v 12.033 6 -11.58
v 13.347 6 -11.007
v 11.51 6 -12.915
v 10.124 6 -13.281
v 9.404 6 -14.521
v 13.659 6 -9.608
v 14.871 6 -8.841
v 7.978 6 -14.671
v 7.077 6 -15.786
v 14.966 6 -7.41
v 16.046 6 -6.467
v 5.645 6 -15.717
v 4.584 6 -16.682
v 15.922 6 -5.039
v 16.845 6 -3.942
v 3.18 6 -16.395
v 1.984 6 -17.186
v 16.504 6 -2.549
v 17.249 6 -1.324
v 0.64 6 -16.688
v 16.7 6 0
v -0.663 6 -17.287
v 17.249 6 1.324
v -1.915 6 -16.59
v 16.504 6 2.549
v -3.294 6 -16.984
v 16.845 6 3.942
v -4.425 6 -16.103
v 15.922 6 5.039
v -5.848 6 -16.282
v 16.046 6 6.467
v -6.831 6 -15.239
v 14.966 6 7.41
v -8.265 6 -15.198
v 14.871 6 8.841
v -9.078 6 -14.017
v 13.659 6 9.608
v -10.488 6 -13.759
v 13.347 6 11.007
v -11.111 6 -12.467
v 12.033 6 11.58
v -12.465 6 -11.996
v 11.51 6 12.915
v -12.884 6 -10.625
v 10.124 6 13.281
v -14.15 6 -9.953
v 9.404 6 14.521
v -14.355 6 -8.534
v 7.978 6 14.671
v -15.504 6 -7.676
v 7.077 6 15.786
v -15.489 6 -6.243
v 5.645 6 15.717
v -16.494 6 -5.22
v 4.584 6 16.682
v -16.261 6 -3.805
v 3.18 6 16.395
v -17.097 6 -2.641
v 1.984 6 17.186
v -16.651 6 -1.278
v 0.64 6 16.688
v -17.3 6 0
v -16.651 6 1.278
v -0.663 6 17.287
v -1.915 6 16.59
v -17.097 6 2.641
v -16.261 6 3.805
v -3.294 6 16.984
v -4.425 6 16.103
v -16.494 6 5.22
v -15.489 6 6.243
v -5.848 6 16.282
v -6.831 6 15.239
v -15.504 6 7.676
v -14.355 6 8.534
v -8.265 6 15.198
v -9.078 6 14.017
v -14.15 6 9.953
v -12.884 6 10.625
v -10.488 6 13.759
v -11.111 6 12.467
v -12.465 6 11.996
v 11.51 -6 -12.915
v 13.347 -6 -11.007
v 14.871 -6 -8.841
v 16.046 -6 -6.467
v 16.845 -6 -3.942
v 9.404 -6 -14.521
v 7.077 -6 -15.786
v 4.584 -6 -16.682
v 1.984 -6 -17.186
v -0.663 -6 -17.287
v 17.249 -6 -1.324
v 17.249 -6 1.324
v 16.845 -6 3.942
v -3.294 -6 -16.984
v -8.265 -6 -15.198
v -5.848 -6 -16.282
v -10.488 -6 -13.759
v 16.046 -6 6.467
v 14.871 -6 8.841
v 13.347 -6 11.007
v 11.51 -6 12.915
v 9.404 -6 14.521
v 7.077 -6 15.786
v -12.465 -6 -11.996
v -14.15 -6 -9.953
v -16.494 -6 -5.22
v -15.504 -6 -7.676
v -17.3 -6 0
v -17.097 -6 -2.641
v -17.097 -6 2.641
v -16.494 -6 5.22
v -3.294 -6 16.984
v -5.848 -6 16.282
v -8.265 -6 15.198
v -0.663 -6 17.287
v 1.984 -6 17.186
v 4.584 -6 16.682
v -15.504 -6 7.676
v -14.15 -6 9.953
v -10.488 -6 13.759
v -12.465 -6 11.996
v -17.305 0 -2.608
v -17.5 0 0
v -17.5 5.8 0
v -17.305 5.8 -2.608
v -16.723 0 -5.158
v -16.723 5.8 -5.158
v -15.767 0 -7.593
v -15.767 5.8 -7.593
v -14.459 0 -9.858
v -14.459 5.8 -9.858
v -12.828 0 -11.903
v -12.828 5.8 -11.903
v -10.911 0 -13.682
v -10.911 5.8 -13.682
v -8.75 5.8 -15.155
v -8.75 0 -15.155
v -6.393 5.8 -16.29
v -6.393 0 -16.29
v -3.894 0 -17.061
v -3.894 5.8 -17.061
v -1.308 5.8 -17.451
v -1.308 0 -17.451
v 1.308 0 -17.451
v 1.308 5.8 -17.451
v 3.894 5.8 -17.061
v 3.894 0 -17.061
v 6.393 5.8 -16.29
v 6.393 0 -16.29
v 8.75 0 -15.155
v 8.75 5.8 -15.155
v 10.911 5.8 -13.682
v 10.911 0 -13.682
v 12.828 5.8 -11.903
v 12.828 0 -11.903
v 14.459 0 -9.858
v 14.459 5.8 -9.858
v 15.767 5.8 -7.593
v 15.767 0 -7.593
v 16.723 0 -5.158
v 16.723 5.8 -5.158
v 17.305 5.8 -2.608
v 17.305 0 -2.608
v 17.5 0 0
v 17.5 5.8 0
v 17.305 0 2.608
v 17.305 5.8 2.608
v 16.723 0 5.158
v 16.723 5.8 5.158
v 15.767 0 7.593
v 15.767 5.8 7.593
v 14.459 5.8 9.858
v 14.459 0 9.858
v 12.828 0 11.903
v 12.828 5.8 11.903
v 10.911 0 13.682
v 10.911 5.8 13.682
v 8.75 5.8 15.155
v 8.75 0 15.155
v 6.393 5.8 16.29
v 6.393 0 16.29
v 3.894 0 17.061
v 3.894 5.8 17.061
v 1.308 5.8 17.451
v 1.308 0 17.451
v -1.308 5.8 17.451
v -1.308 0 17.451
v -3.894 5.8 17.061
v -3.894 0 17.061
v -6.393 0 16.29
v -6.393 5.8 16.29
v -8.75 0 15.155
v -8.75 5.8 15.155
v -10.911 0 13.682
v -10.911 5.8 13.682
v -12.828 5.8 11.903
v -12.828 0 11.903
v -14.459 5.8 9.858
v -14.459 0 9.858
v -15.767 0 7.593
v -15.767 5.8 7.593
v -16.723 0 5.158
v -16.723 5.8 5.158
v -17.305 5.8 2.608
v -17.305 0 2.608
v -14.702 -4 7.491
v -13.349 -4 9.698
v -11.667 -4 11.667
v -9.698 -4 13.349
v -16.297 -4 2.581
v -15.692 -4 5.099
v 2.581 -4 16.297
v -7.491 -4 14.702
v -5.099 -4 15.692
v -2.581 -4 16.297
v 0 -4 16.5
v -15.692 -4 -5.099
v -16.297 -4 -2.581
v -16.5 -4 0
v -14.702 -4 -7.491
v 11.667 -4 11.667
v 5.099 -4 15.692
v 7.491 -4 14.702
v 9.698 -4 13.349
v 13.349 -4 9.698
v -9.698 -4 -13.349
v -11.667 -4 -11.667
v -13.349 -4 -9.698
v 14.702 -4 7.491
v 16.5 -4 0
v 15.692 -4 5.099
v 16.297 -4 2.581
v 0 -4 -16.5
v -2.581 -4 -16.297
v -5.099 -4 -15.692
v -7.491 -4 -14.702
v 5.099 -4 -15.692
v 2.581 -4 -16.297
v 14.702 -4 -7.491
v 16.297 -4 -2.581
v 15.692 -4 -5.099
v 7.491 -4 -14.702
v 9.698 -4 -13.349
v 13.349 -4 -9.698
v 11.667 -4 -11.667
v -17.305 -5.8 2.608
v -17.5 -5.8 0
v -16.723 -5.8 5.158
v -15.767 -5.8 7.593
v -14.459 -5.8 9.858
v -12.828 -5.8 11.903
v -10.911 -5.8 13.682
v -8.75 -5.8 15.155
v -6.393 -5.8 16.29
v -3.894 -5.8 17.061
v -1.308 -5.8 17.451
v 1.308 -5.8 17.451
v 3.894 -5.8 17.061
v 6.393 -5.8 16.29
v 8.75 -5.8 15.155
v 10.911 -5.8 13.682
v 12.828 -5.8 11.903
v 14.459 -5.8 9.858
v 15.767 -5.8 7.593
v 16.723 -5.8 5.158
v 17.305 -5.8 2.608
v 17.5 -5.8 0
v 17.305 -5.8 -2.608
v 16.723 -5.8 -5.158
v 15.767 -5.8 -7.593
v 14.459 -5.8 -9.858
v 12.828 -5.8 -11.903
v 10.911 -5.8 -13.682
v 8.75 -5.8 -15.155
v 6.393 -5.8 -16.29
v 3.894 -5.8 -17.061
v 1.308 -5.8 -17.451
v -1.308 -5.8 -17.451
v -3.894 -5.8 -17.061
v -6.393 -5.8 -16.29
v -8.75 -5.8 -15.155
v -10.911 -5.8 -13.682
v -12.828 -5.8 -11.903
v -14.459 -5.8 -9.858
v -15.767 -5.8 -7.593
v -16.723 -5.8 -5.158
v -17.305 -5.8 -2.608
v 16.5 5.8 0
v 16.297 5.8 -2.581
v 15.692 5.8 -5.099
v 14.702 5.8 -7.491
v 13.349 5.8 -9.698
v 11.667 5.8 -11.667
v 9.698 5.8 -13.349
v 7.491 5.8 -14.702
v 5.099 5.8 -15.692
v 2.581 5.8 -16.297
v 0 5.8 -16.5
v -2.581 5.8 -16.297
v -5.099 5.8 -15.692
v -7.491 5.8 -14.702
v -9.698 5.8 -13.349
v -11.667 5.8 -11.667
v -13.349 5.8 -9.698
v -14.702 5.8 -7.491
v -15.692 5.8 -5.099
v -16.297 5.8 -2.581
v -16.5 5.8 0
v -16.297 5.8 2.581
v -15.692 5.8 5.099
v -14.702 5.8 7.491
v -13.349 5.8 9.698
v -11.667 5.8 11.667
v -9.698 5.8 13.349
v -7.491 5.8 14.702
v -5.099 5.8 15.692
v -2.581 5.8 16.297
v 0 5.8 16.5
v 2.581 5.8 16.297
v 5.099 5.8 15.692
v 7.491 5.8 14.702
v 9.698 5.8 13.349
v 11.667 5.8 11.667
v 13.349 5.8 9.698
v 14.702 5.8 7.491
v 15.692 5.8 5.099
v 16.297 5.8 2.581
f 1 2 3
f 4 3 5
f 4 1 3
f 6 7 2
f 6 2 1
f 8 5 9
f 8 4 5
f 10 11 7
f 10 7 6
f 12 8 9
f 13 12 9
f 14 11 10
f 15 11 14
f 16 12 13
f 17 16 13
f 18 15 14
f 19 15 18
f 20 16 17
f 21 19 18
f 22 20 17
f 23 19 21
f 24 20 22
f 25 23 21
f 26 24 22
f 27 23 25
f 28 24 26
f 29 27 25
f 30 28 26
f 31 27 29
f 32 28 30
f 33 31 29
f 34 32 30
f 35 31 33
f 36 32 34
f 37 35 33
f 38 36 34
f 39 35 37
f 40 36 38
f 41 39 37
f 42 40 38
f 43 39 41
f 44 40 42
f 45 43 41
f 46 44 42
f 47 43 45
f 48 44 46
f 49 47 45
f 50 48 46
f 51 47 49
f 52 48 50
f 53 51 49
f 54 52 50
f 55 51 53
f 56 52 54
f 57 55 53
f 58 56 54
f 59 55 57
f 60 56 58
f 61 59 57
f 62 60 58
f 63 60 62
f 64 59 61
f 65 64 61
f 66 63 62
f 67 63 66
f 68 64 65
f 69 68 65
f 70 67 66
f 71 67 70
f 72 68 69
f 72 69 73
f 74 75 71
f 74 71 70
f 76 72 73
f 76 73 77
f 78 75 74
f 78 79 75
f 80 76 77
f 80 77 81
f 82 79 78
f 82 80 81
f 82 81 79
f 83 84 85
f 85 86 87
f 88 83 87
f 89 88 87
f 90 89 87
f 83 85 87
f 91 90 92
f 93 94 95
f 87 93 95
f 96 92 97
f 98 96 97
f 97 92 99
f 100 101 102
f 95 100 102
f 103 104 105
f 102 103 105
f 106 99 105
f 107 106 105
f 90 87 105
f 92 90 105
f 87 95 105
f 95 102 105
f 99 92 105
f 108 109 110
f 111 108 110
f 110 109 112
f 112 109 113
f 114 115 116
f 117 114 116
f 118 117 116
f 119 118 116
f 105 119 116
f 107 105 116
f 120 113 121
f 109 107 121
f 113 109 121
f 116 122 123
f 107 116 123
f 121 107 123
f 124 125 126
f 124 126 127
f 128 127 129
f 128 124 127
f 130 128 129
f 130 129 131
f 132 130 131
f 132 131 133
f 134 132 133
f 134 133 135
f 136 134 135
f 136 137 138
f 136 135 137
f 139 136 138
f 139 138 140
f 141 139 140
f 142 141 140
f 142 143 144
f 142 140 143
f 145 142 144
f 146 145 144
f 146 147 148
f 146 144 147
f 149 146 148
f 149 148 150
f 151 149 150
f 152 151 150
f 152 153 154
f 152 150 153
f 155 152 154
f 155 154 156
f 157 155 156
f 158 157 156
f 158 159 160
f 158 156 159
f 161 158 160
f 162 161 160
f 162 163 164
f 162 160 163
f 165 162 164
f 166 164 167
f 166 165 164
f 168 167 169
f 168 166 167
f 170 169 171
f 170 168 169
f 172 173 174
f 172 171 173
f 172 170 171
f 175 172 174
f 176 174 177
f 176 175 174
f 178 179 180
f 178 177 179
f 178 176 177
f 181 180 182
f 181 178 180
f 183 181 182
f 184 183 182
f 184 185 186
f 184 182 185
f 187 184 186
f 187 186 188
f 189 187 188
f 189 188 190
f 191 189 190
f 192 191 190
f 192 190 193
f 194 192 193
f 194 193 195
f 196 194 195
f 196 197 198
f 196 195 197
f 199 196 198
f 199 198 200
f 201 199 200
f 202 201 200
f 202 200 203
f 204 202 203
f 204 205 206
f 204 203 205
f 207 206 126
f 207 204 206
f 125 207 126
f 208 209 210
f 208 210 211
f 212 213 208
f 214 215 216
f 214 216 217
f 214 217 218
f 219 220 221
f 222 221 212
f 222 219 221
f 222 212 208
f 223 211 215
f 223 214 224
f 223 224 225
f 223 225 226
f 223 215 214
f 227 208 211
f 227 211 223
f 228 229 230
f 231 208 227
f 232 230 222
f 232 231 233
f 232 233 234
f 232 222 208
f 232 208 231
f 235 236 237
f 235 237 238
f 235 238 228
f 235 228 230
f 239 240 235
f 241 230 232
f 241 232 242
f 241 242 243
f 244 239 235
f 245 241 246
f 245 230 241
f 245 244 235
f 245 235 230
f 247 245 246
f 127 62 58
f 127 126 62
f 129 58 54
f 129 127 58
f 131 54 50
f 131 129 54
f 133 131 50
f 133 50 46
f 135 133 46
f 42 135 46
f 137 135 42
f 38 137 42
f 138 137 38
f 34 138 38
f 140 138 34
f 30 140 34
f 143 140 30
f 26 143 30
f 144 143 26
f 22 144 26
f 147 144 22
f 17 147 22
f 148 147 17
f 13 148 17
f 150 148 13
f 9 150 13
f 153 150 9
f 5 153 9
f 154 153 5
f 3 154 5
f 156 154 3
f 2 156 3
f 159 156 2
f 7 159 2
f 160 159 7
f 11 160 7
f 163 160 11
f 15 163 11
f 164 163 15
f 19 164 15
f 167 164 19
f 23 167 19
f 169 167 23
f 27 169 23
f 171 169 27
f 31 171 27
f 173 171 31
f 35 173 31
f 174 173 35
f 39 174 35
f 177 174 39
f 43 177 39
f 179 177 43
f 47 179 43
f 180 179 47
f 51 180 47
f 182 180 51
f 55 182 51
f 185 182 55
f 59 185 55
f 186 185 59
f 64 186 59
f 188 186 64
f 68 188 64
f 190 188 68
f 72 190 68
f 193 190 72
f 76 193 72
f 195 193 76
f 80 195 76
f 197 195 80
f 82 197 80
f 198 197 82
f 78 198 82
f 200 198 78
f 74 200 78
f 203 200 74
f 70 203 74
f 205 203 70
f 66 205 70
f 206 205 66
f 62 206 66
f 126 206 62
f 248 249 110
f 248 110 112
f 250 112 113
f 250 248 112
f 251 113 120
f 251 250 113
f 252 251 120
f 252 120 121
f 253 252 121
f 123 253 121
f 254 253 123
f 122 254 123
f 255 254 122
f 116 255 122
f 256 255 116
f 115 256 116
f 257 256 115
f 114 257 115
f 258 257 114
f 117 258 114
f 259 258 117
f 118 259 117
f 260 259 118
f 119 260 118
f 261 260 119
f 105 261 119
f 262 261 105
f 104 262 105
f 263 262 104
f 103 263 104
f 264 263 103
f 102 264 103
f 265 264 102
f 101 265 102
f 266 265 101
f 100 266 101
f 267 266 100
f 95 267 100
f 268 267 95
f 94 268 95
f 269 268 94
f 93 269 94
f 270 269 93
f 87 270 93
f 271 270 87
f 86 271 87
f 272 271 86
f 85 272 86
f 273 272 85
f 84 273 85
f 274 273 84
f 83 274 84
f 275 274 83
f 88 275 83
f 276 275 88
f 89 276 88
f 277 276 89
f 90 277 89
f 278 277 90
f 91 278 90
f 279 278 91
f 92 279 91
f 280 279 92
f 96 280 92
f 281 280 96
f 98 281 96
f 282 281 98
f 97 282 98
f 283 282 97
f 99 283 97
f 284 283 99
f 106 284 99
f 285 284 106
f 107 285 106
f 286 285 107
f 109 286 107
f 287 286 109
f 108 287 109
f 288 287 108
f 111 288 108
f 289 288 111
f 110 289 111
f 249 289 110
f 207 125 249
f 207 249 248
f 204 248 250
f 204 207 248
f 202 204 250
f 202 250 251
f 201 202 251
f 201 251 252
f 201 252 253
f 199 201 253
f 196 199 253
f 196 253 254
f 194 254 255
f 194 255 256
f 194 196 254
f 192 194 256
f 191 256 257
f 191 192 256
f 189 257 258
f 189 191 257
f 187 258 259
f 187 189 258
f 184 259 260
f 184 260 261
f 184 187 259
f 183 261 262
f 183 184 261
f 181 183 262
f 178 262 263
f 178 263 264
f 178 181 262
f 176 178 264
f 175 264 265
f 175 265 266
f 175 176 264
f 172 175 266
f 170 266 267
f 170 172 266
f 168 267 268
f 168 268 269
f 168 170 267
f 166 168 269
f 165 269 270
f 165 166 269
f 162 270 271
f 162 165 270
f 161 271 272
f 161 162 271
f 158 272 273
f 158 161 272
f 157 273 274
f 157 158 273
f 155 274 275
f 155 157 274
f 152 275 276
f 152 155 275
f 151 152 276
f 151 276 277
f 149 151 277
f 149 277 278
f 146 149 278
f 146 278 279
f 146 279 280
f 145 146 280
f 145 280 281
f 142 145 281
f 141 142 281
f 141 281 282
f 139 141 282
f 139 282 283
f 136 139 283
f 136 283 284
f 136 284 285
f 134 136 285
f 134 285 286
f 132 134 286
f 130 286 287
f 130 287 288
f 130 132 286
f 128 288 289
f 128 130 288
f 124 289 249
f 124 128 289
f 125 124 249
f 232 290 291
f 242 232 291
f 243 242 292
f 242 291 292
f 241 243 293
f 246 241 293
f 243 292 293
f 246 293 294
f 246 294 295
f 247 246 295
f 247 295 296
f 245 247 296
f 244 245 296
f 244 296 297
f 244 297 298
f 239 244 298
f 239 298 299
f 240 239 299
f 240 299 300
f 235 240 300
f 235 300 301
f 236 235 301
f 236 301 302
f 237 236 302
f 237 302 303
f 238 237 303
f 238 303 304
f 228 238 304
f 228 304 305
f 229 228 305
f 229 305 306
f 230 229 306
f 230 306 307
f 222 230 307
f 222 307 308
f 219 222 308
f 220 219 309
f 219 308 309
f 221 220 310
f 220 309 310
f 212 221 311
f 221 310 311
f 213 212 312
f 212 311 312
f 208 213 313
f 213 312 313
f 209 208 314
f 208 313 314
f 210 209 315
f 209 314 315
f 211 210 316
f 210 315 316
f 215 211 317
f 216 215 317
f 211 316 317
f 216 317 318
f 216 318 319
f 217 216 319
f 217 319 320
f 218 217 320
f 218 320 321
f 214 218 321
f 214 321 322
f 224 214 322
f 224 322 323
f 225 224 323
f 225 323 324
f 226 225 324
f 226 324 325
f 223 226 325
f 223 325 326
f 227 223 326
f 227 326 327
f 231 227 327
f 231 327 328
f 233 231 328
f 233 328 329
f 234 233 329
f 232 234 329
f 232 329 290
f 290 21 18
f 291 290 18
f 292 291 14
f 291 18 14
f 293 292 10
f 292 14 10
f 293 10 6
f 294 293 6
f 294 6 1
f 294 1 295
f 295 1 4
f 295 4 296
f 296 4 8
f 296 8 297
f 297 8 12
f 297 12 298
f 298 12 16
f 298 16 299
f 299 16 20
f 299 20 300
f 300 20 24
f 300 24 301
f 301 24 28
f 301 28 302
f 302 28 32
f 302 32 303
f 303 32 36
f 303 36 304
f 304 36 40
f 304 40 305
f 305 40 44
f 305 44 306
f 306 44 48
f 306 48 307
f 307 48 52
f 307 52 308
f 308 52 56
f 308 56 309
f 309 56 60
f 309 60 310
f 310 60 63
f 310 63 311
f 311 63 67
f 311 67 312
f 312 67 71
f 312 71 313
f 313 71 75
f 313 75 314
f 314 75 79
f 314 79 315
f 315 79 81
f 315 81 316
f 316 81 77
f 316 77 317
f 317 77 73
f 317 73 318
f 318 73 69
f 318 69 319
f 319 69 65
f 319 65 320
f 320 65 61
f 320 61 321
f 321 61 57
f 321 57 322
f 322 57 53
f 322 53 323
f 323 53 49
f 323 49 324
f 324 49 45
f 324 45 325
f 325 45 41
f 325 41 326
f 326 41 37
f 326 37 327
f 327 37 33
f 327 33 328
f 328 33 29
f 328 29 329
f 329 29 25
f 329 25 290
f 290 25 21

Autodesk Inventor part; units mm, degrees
ref_plane "YZ Plane" through (0, 0, 0) normal (1, 0, 0) x (0, 1, 0)
ref_plane "XZ Plane" through (0, 0, 0) normal (0, 1, 0) x (-1, 0, 0)
ref_plane "XY Plane" through (0, 0, 0) normal (0, 0, 1) x (1, 0, 0)
sketch "Sketch4" plane through (0, 0, 0) normal (0, 1, 0) x (-1, 0, 0)
  circle A0 centre (0, 0) radius 17.5
extrude "Extrusion2" add sketch "Sketch4" along normal mid plane 12
sketch "Sketch12" plane through (0, 6, 0) normal (0, 1, 0) x (1, 0, 0)
  circle A0 centre (0, 0) radius 16.5
  dimension "d85" = 33
extrude "Extrusion8" cut sketch "Sketch12" against normal blind 10
sketch "Sketch13" plane through (0, -4, 0) normal (0, 1, 0) x (1, 0, 0)
  point P0 (0, 0)
chamfer "Chamfer1" distance 0.2 angle 45 3 edges at (17.5, 6, 0) (-16.5, 6, 0) (17.5, -6, 0)
properties part number "Shallow Dish" material "Brass, Soft Yellow"
